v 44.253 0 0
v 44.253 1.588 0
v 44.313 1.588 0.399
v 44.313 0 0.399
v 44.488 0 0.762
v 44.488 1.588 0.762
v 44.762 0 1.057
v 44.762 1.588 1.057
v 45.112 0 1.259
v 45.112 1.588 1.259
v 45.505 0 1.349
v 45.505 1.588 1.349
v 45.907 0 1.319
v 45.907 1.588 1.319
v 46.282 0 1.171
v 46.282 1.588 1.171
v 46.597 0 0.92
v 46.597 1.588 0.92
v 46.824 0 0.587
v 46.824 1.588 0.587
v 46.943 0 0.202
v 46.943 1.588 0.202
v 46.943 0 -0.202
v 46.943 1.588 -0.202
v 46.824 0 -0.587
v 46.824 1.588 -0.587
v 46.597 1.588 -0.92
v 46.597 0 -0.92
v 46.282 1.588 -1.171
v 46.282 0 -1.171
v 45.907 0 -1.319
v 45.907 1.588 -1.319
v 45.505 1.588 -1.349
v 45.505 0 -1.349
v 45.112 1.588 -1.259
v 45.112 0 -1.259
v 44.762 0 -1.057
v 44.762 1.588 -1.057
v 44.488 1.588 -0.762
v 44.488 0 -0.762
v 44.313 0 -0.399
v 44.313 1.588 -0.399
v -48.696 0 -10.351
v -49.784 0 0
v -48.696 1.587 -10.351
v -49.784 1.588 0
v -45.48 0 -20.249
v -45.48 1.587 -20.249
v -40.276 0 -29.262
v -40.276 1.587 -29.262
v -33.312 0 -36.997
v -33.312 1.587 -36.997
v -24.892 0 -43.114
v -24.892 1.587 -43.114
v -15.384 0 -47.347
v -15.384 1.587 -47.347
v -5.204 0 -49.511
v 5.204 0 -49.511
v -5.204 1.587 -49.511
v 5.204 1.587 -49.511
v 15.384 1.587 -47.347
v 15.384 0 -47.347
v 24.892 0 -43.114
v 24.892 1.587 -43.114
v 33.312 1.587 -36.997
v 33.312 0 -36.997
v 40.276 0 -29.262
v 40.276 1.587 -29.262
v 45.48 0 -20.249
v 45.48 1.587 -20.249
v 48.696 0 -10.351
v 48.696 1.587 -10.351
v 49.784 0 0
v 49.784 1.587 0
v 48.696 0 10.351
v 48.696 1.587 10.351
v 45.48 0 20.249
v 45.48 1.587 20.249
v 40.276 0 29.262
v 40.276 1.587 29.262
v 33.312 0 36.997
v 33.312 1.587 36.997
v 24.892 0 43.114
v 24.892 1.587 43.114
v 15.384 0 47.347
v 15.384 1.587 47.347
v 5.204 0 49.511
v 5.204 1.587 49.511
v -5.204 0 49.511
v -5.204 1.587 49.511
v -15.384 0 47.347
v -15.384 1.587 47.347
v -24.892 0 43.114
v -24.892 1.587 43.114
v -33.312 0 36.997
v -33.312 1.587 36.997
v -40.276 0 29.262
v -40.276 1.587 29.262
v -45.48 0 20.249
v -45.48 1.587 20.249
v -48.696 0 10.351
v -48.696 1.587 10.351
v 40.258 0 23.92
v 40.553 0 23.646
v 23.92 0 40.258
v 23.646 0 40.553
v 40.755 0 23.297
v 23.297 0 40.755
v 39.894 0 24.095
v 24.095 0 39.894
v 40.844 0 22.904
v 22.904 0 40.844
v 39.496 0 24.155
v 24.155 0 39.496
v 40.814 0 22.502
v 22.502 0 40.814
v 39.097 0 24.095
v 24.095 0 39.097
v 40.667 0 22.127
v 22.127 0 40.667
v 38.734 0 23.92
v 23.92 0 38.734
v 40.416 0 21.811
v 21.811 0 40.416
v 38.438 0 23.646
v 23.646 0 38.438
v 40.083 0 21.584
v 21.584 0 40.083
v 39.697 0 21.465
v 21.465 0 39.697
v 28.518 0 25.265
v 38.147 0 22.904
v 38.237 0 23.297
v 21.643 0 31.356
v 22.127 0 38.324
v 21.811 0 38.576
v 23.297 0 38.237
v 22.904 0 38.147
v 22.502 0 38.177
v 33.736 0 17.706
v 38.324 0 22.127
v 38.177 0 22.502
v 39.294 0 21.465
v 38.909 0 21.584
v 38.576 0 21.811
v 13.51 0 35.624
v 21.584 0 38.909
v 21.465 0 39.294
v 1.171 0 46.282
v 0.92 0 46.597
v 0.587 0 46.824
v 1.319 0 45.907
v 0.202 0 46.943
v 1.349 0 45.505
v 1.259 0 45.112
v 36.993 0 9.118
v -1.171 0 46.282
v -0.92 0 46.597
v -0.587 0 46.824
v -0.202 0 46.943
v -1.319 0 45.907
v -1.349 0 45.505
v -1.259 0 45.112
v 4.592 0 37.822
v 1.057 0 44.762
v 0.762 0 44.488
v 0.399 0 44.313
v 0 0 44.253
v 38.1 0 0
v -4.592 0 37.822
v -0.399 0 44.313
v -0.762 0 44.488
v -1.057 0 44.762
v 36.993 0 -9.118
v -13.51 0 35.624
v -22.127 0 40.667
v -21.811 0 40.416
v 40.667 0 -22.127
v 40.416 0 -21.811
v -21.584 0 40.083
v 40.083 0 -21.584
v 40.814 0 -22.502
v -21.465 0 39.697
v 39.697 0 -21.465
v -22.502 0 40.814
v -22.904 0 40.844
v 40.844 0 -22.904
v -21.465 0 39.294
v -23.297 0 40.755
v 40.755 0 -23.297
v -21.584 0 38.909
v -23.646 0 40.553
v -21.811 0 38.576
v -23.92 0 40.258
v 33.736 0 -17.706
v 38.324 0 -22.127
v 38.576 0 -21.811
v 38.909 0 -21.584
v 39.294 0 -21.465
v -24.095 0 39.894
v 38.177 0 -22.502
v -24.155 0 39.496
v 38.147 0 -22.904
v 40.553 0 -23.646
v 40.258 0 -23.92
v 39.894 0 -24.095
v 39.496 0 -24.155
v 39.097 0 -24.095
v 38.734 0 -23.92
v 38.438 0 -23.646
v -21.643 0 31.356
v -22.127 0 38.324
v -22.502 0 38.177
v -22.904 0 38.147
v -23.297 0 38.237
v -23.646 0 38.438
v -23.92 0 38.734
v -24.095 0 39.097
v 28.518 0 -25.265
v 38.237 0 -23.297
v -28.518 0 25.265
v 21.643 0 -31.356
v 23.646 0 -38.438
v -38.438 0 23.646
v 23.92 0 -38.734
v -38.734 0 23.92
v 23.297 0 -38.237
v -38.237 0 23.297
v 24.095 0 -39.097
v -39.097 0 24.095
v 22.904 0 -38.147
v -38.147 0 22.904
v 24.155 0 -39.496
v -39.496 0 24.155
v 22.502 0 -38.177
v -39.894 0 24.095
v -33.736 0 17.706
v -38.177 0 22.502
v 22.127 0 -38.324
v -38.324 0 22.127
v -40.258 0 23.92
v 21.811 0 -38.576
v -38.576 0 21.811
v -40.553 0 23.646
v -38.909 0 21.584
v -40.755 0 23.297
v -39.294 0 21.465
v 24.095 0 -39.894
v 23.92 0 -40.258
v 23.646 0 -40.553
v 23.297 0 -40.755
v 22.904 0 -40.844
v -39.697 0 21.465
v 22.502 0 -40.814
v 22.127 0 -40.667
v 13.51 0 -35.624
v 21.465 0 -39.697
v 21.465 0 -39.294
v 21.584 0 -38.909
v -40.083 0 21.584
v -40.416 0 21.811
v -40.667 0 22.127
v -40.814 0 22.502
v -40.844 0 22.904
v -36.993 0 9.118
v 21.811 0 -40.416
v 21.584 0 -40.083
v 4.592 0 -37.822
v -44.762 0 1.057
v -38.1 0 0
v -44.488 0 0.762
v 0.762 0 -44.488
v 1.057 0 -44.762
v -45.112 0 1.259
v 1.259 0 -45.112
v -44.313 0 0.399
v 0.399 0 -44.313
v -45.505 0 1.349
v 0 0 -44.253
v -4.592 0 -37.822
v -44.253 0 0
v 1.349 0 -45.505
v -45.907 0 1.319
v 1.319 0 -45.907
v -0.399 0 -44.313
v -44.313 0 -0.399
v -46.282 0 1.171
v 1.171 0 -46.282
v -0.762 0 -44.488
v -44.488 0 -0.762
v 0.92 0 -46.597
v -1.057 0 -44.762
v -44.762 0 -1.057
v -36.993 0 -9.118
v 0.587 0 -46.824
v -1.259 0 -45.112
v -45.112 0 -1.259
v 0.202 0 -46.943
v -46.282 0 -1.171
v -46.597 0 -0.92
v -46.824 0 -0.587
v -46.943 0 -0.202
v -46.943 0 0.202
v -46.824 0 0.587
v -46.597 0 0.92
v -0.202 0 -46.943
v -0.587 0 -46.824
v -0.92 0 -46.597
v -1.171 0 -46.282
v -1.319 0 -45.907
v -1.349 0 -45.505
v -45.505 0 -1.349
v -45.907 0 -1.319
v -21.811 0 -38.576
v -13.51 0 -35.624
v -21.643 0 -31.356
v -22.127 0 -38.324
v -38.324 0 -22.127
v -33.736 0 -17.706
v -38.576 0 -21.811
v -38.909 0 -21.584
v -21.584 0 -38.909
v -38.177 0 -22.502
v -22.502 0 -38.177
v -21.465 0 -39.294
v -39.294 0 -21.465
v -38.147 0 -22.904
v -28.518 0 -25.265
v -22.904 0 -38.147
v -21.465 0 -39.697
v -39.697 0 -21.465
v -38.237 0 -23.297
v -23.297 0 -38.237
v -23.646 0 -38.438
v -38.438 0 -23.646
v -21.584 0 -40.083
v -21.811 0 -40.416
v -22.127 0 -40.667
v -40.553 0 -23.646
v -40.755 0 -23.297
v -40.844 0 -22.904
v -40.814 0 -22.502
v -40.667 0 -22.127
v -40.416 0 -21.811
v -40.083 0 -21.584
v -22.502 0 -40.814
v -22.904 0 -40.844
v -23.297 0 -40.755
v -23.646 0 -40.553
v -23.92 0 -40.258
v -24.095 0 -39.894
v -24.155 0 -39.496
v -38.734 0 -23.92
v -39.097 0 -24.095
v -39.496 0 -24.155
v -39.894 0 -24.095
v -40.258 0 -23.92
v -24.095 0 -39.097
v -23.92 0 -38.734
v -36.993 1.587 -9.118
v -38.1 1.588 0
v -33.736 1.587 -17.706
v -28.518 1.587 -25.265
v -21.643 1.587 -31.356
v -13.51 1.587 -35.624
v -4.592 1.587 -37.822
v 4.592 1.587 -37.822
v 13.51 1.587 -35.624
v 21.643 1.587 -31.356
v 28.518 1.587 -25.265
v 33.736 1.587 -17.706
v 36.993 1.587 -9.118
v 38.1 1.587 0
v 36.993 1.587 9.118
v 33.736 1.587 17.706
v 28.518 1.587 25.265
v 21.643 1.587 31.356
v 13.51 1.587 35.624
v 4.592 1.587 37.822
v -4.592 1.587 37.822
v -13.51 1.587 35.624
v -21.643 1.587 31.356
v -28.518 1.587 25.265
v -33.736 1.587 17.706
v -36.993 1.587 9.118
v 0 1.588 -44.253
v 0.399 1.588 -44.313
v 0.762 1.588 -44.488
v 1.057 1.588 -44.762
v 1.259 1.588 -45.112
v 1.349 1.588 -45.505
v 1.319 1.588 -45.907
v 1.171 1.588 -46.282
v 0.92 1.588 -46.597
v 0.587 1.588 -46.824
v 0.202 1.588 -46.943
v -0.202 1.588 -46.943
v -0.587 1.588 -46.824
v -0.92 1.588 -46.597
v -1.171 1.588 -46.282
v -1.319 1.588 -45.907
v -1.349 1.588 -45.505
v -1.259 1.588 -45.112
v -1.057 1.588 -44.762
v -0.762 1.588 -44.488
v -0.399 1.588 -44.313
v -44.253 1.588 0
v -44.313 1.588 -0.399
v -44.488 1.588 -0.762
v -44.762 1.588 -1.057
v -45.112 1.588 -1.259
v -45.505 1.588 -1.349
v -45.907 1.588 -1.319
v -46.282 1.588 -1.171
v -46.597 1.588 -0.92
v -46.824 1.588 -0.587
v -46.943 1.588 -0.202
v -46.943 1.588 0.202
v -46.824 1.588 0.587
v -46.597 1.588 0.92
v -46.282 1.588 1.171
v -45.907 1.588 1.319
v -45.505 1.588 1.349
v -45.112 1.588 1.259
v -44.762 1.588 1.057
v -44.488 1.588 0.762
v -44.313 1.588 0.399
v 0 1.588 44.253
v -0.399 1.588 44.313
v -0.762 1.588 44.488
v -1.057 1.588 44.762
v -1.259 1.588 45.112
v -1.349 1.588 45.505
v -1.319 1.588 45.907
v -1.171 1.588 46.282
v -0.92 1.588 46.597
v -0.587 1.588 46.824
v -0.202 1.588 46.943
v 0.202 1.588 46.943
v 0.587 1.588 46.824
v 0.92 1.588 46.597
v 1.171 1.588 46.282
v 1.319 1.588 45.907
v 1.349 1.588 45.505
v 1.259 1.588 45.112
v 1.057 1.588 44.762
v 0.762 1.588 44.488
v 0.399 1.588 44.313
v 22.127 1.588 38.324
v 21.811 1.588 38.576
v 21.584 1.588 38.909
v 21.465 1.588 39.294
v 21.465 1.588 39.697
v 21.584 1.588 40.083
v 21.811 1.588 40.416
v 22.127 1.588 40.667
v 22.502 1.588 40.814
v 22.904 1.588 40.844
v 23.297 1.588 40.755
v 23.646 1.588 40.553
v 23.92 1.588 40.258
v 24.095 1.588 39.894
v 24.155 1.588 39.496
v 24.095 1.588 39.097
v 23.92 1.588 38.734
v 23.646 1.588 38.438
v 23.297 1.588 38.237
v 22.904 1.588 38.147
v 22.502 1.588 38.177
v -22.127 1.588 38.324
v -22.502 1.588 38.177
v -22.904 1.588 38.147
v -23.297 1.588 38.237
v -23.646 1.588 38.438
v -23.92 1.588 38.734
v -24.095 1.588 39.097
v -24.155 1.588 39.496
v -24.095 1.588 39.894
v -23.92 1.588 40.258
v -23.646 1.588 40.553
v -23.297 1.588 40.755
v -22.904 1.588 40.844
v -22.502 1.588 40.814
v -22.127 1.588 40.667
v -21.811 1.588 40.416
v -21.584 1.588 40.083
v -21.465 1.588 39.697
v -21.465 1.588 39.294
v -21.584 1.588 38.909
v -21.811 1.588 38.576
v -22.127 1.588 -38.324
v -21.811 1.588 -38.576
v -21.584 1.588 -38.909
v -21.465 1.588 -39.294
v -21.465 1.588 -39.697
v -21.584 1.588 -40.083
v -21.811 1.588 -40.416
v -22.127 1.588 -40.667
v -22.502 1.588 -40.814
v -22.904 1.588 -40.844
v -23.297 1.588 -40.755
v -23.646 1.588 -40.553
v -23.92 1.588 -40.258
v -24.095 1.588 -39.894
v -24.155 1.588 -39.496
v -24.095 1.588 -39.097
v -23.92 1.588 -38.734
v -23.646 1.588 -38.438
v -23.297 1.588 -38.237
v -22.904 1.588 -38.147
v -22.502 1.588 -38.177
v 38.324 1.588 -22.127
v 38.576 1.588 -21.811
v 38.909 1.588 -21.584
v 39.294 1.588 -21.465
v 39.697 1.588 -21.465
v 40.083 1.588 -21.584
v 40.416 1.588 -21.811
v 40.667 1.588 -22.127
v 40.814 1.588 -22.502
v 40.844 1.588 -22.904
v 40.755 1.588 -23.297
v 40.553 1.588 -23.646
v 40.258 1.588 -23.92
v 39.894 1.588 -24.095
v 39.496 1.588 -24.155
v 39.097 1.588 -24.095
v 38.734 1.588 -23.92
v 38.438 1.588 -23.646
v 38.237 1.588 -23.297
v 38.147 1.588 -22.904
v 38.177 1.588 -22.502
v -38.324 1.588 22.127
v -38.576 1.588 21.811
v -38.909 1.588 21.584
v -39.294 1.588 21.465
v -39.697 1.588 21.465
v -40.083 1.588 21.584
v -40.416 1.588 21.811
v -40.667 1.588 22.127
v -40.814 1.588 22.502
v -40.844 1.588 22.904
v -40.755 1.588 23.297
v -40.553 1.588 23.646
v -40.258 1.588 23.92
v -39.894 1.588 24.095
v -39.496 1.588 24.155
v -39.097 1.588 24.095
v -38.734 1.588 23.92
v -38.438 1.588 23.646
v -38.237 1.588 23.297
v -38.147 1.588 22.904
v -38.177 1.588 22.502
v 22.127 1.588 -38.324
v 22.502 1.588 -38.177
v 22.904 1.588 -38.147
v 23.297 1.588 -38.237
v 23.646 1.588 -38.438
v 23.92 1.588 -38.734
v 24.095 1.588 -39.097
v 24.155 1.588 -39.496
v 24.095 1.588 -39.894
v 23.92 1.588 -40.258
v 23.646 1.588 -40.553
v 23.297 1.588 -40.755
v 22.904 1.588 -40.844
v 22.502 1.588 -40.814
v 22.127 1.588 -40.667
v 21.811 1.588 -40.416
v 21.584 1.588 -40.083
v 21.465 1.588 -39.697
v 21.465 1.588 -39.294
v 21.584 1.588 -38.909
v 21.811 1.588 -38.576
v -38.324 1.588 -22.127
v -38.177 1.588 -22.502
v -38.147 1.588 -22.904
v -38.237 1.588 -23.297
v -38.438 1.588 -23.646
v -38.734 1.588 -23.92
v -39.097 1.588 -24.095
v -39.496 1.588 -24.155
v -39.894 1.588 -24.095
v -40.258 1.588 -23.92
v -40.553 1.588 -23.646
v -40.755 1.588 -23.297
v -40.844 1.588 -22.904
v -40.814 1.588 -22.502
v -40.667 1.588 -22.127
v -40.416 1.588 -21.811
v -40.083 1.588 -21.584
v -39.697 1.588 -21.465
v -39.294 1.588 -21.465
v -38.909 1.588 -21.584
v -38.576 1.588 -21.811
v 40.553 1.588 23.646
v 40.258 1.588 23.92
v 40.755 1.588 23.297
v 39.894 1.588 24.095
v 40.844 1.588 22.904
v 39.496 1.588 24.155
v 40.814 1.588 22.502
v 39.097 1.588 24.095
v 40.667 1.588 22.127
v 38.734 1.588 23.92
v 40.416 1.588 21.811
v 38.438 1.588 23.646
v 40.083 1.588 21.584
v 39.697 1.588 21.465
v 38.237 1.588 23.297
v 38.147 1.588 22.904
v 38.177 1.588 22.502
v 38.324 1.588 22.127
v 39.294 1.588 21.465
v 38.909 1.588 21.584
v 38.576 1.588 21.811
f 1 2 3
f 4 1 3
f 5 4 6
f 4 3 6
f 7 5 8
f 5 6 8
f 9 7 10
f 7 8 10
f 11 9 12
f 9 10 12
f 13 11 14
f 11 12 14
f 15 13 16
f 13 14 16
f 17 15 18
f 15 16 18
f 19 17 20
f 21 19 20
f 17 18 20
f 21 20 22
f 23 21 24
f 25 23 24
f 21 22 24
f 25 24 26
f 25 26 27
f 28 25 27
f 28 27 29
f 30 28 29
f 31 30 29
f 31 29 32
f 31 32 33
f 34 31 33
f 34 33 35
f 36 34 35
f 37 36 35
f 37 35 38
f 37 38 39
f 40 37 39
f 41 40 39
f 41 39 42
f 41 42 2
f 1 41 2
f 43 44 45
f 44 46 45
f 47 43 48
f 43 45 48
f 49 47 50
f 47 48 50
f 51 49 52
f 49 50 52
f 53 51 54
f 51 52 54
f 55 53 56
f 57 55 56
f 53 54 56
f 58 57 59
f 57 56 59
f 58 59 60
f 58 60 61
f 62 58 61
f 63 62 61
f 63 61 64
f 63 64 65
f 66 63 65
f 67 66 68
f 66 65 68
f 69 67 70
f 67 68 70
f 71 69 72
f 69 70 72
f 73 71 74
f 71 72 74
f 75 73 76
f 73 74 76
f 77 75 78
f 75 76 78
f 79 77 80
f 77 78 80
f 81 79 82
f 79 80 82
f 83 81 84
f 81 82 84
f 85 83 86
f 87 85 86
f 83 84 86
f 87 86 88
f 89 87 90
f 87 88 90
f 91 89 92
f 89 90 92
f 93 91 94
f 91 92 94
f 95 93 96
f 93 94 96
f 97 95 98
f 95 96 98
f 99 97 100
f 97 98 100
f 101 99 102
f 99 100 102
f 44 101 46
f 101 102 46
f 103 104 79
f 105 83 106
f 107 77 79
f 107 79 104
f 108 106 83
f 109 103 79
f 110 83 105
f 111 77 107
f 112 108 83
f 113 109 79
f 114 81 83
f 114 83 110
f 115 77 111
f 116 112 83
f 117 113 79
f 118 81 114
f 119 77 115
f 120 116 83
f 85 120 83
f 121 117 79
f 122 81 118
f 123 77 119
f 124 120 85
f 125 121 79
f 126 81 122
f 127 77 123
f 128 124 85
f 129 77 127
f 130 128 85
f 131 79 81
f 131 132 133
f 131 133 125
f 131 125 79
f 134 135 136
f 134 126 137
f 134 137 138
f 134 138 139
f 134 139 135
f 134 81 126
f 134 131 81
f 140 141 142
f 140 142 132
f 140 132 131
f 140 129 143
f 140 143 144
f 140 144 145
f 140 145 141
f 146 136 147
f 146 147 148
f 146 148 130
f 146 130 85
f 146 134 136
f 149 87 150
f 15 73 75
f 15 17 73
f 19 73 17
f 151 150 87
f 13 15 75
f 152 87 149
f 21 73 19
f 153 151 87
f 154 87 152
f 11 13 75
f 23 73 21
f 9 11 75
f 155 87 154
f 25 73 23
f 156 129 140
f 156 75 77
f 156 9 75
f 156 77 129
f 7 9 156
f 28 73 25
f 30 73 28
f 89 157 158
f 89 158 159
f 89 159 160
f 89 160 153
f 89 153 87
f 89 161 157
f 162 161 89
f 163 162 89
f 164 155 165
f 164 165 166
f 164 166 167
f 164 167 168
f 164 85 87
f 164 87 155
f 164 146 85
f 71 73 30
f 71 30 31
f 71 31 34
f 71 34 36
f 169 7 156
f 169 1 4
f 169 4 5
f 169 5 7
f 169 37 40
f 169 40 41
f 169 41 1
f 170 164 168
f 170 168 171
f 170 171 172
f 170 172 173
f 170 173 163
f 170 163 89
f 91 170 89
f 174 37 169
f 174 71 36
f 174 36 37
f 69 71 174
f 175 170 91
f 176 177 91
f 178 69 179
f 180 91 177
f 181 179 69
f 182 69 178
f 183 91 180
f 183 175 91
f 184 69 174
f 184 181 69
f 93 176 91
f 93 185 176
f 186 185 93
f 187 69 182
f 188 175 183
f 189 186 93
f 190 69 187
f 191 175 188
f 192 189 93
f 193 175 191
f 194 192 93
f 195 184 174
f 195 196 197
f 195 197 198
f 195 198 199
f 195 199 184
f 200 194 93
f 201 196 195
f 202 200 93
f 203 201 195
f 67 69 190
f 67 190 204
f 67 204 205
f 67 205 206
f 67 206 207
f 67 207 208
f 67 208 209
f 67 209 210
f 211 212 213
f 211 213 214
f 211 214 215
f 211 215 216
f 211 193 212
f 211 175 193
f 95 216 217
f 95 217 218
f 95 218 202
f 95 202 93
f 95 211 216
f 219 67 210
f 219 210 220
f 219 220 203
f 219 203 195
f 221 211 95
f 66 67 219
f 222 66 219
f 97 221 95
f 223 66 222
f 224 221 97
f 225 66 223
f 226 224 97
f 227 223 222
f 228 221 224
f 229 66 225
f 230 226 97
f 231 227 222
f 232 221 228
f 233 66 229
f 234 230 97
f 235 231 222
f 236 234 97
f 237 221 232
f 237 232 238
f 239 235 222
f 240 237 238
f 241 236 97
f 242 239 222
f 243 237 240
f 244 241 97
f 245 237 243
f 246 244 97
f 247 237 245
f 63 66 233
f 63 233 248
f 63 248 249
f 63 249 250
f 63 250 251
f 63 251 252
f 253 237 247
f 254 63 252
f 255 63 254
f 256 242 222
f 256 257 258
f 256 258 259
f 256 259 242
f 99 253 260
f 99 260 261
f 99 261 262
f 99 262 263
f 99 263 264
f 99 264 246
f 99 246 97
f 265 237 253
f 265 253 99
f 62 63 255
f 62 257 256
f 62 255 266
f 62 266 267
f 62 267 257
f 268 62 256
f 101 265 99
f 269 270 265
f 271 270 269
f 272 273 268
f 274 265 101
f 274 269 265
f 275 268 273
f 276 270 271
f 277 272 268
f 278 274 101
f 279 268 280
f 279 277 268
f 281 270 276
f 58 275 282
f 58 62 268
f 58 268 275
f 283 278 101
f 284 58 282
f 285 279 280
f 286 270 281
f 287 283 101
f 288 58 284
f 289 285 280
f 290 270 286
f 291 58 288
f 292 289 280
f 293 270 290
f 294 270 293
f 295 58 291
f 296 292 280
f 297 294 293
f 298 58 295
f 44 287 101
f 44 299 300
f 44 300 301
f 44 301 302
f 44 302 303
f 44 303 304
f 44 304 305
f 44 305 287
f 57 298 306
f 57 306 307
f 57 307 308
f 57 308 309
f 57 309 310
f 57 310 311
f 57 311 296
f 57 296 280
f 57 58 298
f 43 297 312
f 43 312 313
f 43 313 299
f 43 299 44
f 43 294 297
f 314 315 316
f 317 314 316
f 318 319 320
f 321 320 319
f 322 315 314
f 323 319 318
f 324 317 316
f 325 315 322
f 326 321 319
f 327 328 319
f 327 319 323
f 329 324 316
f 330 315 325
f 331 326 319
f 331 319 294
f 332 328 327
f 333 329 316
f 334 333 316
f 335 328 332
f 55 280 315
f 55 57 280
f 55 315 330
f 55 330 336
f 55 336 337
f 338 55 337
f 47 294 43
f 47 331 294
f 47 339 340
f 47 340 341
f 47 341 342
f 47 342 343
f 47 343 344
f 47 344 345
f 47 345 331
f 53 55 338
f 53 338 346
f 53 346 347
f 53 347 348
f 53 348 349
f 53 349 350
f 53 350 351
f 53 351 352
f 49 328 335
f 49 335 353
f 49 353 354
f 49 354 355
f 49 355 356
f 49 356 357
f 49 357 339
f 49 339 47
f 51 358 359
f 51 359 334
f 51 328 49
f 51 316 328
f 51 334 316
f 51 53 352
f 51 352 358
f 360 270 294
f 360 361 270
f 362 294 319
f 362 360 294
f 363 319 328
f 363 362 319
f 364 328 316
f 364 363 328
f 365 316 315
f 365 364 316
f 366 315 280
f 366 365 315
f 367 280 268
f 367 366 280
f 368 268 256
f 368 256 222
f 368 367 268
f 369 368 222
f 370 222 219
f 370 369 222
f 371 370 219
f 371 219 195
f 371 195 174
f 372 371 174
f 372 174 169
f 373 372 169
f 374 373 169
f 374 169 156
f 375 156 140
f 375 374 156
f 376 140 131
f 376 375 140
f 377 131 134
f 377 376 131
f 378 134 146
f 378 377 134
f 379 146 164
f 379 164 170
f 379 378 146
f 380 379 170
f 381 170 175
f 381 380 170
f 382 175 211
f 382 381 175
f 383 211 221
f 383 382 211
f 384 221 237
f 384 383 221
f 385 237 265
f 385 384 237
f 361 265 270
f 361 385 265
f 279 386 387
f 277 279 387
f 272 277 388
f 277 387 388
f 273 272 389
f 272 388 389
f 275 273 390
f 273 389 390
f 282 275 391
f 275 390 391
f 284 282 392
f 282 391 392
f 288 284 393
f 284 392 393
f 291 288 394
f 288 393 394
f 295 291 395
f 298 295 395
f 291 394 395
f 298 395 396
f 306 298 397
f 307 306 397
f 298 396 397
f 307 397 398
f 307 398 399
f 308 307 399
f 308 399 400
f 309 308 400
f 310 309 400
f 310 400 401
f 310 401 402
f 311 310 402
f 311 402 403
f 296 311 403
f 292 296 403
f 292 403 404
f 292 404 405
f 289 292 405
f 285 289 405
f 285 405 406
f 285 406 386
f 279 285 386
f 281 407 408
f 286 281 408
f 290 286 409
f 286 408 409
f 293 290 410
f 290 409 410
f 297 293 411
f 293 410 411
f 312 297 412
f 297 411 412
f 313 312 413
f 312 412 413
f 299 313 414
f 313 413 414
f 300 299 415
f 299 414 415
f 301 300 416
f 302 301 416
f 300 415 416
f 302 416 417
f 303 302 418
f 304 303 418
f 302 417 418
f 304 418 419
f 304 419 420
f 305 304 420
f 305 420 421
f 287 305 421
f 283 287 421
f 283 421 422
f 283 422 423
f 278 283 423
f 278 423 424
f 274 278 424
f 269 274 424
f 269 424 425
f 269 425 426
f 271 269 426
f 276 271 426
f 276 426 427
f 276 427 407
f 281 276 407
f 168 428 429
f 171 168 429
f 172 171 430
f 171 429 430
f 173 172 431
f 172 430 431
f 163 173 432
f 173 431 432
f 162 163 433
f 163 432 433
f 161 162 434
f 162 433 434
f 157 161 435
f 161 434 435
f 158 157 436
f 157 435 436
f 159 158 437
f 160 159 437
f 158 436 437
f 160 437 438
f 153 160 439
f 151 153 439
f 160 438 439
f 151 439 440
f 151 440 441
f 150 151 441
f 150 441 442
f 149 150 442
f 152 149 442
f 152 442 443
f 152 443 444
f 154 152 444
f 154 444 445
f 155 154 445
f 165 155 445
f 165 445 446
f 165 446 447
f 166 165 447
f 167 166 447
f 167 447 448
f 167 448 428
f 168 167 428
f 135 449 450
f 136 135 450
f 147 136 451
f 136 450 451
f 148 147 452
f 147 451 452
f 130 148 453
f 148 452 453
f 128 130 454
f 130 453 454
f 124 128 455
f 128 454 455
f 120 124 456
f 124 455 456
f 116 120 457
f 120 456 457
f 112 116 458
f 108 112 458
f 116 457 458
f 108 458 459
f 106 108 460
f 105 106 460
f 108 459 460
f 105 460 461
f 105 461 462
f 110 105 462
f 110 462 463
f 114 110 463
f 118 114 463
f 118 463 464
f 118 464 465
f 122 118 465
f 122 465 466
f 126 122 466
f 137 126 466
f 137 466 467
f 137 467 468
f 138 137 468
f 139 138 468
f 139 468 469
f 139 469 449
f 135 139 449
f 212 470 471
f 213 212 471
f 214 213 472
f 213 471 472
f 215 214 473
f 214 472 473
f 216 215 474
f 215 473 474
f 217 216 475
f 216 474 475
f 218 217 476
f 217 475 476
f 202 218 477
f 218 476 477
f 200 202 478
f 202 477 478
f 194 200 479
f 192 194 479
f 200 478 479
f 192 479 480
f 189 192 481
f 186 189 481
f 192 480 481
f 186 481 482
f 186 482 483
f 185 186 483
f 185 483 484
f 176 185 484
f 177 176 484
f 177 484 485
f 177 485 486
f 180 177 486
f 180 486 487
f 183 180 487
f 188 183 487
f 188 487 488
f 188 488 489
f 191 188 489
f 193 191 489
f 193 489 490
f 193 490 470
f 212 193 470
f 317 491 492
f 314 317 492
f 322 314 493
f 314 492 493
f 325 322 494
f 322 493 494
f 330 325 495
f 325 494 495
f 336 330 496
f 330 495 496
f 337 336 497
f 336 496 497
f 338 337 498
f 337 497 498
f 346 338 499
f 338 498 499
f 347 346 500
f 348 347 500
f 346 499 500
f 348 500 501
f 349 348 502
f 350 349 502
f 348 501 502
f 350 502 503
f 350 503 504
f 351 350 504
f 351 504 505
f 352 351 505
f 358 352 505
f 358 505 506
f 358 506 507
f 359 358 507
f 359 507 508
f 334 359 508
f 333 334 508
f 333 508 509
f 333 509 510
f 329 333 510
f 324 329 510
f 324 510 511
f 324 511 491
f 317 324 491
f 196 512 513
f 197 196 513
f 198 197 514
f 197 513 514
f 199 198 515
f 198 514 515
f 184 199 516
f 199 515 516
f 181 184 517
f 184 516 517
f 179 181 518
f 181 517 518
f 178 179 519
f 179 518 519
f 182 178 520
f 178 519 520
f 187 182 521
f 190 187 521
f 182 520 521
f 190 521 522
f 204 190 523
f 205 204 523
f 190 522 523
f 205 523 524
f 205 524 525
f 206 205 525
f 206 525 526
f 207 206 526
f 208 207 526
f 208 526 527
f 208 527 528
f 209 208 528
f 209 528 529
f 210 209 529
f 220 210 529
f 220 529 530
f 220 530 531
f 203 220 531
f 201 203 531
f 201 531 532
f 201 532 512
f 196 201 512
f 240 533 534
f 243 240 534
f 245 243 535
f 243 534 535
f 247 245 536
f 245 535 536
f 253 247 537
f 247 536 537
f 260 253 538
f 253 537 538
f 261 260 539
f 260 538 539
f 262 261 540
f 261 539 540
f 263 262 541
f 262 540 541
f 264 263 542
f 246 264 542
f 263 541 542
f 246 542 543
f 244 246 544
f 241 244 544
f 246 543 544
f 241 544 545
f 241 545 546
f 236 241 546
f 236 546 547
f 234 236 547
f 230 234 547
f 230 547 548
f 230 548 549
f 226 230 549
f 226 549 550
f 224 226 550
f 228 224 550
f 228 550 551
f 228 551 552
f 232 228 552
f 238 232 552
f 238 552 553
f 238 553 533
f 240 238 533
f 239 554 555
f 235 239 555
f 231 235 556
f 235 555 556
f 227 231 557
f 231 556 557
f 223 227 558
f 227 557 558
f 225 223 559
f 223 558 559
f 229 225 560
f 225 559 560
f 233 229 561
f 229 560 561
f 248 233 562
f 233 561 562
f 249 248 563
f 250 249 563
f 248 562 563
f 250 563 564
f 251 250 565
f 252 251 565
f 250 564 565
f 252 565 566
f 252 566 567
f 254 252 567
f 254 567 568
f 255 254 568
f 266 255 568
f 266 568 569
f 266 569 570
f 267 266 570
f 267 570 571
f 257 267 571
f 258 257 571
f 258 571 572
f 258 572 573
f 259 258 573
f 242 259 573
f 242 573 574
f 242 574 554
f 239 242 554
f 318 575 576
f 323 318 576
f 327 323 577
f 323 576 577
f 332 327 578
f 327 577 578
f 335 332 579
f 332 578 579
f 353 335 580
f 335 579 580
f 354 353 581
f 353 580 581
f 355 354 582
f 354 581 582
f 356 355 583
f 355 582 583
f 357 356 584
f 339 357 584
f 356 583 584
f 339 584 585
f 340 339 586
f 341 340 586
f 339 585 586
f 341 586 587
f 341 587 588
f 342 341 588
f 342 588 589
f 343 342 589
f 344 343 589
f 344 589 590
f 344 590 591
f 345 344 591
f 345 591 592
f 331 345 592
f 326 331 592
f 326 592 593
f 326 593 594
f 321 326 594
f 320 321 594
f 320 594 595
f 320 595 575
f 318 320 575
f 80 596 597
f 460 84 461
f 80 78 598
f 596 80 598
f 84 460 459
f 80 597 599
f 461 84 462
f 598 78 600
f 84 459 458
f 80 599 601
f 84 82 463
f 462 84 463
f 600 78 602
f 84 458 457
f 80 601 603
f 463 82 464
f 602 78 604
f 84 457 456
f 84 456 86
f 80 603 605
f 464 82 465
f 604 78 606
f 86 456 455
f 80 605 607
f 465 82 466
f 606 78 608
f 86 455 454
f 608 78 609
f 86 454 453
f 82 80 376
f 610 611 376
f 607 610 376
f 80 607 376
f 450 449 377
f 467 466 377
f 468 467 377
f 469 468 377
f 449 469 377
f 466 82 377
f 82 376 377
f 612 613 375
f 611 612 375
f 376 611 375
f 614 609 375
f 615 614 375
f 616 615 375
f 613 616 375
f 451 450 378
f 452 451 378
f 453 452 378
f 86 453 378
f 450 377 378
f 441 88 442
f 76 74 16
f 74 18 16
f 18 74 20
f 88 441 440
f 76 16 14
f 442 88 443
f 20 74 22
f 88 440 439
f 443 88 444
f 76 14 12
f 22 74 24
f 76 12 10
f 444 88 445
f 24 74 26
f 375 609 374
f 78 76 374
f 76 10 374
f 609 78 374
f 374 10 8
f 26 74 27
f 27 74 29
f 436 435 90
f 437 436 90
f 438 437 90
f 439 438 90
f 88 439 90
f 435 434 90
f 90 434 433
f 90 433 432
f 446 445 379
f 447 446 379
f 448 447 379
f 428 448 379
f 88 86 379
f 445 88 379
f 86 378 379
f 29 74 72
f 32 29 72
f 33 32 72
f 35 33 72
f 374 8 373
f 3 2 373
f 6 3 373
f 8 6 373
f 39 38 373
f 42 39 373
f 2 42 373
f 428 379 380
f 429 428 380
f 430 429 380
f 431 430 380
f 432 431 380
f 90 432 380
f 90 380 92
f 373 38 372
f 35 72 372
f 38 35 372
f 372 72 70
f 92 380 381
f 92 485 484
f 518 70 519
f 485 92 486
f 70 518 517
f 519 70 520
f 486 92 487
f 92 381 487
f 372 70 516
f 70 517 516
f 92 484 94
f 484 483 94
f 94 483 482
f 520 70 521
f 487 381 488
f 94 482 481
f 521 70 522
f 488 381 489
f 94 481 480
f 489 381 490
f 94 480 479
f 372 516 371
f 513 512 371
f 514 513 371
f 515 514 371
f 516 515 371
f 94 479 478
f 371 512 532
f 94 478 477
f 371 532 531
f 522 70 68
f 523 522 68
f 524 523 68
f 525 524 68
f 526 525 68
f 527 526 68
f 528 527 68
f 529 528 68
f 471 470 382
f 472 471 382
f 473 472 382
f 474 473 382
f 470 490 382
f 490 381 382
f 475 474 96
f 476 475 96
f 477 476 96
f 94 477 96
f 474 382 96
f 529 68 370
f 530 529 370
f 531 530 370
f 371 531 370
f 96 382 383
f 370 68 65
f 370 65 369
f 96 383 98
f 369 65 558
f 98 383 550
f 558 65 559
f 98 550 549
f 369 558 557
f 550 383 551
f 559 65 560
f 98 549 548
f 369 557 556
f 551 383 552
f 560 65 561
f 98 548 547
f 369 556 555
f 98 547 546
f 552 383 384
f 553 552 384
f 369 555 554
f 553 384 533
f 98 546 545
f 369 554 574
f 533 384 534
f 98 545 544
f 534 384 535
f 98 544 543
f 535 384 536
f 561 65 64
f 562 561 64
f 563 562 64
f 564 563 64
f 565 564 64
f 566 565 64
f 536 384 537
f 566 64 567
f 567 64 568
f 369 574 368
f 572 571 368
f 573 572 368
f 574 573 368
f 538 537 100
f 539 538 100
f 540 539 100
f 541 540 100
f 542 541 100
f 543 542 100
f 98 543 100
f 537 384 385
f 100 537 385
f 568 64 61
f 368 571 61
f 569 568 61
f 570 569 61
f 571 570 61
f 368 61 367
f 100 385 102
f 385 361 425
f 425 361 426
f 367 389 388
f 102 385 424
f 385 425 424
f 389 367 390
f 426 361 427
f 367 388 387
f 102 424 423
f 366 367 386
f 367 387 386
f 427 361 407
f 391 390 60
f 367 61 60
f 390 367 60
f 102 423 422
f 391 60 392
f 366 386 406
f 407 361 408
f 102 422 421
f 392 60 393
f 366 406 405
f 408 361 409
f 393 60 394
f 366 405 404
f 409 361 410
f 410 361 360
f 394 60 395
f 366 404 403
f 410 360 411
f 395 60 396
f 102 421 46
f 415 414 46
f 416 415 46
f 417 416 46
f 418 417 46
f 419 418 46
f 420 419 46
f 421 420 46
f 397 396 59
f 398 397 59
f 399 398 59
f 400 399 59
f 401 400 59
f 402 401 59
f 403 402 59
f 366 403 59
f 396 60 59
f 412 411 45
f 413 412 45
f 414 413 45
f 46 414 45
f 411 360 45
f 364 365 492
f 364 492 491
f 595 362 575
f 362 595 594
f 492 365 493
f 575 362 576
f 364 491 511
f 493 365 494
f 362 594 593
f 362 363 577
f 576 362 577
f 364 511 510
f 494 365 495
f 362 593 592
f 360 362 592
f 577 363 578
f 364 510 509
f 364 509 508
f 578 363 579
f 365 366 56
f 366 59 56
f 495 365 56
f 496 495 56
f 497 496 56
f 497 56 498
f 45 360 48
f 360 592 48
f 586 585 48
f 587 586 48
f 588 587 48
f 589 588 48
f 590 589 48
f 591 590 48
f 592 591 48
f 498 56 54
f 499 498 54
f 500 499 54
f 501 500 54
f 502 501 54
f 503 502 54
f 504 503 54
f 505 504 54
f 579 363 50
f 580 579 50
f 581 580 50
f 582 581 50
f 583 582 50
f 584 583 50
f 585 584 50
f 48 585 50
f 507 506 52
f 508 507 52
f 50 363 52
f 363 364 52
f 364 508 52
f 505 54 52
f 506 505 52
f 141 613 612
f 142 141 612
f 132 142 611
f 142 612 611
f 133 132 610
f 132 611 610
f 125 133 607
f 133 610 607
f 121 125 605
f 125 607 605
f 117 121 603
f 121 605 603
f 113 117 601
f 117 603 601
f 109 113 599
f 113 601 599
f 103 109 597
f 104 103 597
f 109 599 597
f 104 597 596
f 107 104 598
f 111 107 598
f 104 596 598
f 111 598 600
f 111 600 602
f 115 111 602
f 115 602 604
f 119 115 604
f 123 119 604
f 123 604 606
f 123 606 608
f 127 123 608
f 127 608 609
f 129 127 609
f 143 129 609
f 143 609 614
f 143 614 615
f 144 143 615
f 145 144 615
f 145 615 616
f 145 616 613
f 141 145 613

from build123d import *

# Parameters (mm, degrees)
SKETCH1_W                    = 11.684
SKETCH1_H                    = 1.5875
F_36_0_1065_DIAMETER_HOLE1_D = 2.7051
SCREW_PASSTHROUGHS_COUNT     = 12


with BuildPart() as part:
    # Sketch1 → Main (revolve)
    with BuildSketch(Plane.XY):
        with Locations((-43.942, 0.79375)):
            Rectangle(SKETCH1_W, SKETCH1_H)
    revolve(axis=Axis((0, 55, 0), (0, -1, 0)))

    # #36 (0.1065) Diameter Hole1 (through all)
    with Locations(Plane(origin=(0, 0, 0), x_dir=(-1, 0, 0), z_dir=(0, -1, 0))):
        with Locations((45.6057, 0)):
            f_36_0_1065_diameter_hole1 = Hole(F_36_0_1065_DIAMETER_HOLE1_D / 2)

    # Screw Passthroughs: #36 (0.1065) Diameter Hole1 ×12 about axis
    screw_passthroughs_axis = Axis((0, 0, 0), (0, 1, 0))
    for i in range(1, SCREW_PASSTHROUGHS_COUNT):
        add(f_36_0_1065_diameter_hole1.rotate(screw_passthroughs_axis, i * 360 / SCREW_PASSTHROUGHS_COUNT), mode=Mode.SUBTRACT)


solid = part.part
